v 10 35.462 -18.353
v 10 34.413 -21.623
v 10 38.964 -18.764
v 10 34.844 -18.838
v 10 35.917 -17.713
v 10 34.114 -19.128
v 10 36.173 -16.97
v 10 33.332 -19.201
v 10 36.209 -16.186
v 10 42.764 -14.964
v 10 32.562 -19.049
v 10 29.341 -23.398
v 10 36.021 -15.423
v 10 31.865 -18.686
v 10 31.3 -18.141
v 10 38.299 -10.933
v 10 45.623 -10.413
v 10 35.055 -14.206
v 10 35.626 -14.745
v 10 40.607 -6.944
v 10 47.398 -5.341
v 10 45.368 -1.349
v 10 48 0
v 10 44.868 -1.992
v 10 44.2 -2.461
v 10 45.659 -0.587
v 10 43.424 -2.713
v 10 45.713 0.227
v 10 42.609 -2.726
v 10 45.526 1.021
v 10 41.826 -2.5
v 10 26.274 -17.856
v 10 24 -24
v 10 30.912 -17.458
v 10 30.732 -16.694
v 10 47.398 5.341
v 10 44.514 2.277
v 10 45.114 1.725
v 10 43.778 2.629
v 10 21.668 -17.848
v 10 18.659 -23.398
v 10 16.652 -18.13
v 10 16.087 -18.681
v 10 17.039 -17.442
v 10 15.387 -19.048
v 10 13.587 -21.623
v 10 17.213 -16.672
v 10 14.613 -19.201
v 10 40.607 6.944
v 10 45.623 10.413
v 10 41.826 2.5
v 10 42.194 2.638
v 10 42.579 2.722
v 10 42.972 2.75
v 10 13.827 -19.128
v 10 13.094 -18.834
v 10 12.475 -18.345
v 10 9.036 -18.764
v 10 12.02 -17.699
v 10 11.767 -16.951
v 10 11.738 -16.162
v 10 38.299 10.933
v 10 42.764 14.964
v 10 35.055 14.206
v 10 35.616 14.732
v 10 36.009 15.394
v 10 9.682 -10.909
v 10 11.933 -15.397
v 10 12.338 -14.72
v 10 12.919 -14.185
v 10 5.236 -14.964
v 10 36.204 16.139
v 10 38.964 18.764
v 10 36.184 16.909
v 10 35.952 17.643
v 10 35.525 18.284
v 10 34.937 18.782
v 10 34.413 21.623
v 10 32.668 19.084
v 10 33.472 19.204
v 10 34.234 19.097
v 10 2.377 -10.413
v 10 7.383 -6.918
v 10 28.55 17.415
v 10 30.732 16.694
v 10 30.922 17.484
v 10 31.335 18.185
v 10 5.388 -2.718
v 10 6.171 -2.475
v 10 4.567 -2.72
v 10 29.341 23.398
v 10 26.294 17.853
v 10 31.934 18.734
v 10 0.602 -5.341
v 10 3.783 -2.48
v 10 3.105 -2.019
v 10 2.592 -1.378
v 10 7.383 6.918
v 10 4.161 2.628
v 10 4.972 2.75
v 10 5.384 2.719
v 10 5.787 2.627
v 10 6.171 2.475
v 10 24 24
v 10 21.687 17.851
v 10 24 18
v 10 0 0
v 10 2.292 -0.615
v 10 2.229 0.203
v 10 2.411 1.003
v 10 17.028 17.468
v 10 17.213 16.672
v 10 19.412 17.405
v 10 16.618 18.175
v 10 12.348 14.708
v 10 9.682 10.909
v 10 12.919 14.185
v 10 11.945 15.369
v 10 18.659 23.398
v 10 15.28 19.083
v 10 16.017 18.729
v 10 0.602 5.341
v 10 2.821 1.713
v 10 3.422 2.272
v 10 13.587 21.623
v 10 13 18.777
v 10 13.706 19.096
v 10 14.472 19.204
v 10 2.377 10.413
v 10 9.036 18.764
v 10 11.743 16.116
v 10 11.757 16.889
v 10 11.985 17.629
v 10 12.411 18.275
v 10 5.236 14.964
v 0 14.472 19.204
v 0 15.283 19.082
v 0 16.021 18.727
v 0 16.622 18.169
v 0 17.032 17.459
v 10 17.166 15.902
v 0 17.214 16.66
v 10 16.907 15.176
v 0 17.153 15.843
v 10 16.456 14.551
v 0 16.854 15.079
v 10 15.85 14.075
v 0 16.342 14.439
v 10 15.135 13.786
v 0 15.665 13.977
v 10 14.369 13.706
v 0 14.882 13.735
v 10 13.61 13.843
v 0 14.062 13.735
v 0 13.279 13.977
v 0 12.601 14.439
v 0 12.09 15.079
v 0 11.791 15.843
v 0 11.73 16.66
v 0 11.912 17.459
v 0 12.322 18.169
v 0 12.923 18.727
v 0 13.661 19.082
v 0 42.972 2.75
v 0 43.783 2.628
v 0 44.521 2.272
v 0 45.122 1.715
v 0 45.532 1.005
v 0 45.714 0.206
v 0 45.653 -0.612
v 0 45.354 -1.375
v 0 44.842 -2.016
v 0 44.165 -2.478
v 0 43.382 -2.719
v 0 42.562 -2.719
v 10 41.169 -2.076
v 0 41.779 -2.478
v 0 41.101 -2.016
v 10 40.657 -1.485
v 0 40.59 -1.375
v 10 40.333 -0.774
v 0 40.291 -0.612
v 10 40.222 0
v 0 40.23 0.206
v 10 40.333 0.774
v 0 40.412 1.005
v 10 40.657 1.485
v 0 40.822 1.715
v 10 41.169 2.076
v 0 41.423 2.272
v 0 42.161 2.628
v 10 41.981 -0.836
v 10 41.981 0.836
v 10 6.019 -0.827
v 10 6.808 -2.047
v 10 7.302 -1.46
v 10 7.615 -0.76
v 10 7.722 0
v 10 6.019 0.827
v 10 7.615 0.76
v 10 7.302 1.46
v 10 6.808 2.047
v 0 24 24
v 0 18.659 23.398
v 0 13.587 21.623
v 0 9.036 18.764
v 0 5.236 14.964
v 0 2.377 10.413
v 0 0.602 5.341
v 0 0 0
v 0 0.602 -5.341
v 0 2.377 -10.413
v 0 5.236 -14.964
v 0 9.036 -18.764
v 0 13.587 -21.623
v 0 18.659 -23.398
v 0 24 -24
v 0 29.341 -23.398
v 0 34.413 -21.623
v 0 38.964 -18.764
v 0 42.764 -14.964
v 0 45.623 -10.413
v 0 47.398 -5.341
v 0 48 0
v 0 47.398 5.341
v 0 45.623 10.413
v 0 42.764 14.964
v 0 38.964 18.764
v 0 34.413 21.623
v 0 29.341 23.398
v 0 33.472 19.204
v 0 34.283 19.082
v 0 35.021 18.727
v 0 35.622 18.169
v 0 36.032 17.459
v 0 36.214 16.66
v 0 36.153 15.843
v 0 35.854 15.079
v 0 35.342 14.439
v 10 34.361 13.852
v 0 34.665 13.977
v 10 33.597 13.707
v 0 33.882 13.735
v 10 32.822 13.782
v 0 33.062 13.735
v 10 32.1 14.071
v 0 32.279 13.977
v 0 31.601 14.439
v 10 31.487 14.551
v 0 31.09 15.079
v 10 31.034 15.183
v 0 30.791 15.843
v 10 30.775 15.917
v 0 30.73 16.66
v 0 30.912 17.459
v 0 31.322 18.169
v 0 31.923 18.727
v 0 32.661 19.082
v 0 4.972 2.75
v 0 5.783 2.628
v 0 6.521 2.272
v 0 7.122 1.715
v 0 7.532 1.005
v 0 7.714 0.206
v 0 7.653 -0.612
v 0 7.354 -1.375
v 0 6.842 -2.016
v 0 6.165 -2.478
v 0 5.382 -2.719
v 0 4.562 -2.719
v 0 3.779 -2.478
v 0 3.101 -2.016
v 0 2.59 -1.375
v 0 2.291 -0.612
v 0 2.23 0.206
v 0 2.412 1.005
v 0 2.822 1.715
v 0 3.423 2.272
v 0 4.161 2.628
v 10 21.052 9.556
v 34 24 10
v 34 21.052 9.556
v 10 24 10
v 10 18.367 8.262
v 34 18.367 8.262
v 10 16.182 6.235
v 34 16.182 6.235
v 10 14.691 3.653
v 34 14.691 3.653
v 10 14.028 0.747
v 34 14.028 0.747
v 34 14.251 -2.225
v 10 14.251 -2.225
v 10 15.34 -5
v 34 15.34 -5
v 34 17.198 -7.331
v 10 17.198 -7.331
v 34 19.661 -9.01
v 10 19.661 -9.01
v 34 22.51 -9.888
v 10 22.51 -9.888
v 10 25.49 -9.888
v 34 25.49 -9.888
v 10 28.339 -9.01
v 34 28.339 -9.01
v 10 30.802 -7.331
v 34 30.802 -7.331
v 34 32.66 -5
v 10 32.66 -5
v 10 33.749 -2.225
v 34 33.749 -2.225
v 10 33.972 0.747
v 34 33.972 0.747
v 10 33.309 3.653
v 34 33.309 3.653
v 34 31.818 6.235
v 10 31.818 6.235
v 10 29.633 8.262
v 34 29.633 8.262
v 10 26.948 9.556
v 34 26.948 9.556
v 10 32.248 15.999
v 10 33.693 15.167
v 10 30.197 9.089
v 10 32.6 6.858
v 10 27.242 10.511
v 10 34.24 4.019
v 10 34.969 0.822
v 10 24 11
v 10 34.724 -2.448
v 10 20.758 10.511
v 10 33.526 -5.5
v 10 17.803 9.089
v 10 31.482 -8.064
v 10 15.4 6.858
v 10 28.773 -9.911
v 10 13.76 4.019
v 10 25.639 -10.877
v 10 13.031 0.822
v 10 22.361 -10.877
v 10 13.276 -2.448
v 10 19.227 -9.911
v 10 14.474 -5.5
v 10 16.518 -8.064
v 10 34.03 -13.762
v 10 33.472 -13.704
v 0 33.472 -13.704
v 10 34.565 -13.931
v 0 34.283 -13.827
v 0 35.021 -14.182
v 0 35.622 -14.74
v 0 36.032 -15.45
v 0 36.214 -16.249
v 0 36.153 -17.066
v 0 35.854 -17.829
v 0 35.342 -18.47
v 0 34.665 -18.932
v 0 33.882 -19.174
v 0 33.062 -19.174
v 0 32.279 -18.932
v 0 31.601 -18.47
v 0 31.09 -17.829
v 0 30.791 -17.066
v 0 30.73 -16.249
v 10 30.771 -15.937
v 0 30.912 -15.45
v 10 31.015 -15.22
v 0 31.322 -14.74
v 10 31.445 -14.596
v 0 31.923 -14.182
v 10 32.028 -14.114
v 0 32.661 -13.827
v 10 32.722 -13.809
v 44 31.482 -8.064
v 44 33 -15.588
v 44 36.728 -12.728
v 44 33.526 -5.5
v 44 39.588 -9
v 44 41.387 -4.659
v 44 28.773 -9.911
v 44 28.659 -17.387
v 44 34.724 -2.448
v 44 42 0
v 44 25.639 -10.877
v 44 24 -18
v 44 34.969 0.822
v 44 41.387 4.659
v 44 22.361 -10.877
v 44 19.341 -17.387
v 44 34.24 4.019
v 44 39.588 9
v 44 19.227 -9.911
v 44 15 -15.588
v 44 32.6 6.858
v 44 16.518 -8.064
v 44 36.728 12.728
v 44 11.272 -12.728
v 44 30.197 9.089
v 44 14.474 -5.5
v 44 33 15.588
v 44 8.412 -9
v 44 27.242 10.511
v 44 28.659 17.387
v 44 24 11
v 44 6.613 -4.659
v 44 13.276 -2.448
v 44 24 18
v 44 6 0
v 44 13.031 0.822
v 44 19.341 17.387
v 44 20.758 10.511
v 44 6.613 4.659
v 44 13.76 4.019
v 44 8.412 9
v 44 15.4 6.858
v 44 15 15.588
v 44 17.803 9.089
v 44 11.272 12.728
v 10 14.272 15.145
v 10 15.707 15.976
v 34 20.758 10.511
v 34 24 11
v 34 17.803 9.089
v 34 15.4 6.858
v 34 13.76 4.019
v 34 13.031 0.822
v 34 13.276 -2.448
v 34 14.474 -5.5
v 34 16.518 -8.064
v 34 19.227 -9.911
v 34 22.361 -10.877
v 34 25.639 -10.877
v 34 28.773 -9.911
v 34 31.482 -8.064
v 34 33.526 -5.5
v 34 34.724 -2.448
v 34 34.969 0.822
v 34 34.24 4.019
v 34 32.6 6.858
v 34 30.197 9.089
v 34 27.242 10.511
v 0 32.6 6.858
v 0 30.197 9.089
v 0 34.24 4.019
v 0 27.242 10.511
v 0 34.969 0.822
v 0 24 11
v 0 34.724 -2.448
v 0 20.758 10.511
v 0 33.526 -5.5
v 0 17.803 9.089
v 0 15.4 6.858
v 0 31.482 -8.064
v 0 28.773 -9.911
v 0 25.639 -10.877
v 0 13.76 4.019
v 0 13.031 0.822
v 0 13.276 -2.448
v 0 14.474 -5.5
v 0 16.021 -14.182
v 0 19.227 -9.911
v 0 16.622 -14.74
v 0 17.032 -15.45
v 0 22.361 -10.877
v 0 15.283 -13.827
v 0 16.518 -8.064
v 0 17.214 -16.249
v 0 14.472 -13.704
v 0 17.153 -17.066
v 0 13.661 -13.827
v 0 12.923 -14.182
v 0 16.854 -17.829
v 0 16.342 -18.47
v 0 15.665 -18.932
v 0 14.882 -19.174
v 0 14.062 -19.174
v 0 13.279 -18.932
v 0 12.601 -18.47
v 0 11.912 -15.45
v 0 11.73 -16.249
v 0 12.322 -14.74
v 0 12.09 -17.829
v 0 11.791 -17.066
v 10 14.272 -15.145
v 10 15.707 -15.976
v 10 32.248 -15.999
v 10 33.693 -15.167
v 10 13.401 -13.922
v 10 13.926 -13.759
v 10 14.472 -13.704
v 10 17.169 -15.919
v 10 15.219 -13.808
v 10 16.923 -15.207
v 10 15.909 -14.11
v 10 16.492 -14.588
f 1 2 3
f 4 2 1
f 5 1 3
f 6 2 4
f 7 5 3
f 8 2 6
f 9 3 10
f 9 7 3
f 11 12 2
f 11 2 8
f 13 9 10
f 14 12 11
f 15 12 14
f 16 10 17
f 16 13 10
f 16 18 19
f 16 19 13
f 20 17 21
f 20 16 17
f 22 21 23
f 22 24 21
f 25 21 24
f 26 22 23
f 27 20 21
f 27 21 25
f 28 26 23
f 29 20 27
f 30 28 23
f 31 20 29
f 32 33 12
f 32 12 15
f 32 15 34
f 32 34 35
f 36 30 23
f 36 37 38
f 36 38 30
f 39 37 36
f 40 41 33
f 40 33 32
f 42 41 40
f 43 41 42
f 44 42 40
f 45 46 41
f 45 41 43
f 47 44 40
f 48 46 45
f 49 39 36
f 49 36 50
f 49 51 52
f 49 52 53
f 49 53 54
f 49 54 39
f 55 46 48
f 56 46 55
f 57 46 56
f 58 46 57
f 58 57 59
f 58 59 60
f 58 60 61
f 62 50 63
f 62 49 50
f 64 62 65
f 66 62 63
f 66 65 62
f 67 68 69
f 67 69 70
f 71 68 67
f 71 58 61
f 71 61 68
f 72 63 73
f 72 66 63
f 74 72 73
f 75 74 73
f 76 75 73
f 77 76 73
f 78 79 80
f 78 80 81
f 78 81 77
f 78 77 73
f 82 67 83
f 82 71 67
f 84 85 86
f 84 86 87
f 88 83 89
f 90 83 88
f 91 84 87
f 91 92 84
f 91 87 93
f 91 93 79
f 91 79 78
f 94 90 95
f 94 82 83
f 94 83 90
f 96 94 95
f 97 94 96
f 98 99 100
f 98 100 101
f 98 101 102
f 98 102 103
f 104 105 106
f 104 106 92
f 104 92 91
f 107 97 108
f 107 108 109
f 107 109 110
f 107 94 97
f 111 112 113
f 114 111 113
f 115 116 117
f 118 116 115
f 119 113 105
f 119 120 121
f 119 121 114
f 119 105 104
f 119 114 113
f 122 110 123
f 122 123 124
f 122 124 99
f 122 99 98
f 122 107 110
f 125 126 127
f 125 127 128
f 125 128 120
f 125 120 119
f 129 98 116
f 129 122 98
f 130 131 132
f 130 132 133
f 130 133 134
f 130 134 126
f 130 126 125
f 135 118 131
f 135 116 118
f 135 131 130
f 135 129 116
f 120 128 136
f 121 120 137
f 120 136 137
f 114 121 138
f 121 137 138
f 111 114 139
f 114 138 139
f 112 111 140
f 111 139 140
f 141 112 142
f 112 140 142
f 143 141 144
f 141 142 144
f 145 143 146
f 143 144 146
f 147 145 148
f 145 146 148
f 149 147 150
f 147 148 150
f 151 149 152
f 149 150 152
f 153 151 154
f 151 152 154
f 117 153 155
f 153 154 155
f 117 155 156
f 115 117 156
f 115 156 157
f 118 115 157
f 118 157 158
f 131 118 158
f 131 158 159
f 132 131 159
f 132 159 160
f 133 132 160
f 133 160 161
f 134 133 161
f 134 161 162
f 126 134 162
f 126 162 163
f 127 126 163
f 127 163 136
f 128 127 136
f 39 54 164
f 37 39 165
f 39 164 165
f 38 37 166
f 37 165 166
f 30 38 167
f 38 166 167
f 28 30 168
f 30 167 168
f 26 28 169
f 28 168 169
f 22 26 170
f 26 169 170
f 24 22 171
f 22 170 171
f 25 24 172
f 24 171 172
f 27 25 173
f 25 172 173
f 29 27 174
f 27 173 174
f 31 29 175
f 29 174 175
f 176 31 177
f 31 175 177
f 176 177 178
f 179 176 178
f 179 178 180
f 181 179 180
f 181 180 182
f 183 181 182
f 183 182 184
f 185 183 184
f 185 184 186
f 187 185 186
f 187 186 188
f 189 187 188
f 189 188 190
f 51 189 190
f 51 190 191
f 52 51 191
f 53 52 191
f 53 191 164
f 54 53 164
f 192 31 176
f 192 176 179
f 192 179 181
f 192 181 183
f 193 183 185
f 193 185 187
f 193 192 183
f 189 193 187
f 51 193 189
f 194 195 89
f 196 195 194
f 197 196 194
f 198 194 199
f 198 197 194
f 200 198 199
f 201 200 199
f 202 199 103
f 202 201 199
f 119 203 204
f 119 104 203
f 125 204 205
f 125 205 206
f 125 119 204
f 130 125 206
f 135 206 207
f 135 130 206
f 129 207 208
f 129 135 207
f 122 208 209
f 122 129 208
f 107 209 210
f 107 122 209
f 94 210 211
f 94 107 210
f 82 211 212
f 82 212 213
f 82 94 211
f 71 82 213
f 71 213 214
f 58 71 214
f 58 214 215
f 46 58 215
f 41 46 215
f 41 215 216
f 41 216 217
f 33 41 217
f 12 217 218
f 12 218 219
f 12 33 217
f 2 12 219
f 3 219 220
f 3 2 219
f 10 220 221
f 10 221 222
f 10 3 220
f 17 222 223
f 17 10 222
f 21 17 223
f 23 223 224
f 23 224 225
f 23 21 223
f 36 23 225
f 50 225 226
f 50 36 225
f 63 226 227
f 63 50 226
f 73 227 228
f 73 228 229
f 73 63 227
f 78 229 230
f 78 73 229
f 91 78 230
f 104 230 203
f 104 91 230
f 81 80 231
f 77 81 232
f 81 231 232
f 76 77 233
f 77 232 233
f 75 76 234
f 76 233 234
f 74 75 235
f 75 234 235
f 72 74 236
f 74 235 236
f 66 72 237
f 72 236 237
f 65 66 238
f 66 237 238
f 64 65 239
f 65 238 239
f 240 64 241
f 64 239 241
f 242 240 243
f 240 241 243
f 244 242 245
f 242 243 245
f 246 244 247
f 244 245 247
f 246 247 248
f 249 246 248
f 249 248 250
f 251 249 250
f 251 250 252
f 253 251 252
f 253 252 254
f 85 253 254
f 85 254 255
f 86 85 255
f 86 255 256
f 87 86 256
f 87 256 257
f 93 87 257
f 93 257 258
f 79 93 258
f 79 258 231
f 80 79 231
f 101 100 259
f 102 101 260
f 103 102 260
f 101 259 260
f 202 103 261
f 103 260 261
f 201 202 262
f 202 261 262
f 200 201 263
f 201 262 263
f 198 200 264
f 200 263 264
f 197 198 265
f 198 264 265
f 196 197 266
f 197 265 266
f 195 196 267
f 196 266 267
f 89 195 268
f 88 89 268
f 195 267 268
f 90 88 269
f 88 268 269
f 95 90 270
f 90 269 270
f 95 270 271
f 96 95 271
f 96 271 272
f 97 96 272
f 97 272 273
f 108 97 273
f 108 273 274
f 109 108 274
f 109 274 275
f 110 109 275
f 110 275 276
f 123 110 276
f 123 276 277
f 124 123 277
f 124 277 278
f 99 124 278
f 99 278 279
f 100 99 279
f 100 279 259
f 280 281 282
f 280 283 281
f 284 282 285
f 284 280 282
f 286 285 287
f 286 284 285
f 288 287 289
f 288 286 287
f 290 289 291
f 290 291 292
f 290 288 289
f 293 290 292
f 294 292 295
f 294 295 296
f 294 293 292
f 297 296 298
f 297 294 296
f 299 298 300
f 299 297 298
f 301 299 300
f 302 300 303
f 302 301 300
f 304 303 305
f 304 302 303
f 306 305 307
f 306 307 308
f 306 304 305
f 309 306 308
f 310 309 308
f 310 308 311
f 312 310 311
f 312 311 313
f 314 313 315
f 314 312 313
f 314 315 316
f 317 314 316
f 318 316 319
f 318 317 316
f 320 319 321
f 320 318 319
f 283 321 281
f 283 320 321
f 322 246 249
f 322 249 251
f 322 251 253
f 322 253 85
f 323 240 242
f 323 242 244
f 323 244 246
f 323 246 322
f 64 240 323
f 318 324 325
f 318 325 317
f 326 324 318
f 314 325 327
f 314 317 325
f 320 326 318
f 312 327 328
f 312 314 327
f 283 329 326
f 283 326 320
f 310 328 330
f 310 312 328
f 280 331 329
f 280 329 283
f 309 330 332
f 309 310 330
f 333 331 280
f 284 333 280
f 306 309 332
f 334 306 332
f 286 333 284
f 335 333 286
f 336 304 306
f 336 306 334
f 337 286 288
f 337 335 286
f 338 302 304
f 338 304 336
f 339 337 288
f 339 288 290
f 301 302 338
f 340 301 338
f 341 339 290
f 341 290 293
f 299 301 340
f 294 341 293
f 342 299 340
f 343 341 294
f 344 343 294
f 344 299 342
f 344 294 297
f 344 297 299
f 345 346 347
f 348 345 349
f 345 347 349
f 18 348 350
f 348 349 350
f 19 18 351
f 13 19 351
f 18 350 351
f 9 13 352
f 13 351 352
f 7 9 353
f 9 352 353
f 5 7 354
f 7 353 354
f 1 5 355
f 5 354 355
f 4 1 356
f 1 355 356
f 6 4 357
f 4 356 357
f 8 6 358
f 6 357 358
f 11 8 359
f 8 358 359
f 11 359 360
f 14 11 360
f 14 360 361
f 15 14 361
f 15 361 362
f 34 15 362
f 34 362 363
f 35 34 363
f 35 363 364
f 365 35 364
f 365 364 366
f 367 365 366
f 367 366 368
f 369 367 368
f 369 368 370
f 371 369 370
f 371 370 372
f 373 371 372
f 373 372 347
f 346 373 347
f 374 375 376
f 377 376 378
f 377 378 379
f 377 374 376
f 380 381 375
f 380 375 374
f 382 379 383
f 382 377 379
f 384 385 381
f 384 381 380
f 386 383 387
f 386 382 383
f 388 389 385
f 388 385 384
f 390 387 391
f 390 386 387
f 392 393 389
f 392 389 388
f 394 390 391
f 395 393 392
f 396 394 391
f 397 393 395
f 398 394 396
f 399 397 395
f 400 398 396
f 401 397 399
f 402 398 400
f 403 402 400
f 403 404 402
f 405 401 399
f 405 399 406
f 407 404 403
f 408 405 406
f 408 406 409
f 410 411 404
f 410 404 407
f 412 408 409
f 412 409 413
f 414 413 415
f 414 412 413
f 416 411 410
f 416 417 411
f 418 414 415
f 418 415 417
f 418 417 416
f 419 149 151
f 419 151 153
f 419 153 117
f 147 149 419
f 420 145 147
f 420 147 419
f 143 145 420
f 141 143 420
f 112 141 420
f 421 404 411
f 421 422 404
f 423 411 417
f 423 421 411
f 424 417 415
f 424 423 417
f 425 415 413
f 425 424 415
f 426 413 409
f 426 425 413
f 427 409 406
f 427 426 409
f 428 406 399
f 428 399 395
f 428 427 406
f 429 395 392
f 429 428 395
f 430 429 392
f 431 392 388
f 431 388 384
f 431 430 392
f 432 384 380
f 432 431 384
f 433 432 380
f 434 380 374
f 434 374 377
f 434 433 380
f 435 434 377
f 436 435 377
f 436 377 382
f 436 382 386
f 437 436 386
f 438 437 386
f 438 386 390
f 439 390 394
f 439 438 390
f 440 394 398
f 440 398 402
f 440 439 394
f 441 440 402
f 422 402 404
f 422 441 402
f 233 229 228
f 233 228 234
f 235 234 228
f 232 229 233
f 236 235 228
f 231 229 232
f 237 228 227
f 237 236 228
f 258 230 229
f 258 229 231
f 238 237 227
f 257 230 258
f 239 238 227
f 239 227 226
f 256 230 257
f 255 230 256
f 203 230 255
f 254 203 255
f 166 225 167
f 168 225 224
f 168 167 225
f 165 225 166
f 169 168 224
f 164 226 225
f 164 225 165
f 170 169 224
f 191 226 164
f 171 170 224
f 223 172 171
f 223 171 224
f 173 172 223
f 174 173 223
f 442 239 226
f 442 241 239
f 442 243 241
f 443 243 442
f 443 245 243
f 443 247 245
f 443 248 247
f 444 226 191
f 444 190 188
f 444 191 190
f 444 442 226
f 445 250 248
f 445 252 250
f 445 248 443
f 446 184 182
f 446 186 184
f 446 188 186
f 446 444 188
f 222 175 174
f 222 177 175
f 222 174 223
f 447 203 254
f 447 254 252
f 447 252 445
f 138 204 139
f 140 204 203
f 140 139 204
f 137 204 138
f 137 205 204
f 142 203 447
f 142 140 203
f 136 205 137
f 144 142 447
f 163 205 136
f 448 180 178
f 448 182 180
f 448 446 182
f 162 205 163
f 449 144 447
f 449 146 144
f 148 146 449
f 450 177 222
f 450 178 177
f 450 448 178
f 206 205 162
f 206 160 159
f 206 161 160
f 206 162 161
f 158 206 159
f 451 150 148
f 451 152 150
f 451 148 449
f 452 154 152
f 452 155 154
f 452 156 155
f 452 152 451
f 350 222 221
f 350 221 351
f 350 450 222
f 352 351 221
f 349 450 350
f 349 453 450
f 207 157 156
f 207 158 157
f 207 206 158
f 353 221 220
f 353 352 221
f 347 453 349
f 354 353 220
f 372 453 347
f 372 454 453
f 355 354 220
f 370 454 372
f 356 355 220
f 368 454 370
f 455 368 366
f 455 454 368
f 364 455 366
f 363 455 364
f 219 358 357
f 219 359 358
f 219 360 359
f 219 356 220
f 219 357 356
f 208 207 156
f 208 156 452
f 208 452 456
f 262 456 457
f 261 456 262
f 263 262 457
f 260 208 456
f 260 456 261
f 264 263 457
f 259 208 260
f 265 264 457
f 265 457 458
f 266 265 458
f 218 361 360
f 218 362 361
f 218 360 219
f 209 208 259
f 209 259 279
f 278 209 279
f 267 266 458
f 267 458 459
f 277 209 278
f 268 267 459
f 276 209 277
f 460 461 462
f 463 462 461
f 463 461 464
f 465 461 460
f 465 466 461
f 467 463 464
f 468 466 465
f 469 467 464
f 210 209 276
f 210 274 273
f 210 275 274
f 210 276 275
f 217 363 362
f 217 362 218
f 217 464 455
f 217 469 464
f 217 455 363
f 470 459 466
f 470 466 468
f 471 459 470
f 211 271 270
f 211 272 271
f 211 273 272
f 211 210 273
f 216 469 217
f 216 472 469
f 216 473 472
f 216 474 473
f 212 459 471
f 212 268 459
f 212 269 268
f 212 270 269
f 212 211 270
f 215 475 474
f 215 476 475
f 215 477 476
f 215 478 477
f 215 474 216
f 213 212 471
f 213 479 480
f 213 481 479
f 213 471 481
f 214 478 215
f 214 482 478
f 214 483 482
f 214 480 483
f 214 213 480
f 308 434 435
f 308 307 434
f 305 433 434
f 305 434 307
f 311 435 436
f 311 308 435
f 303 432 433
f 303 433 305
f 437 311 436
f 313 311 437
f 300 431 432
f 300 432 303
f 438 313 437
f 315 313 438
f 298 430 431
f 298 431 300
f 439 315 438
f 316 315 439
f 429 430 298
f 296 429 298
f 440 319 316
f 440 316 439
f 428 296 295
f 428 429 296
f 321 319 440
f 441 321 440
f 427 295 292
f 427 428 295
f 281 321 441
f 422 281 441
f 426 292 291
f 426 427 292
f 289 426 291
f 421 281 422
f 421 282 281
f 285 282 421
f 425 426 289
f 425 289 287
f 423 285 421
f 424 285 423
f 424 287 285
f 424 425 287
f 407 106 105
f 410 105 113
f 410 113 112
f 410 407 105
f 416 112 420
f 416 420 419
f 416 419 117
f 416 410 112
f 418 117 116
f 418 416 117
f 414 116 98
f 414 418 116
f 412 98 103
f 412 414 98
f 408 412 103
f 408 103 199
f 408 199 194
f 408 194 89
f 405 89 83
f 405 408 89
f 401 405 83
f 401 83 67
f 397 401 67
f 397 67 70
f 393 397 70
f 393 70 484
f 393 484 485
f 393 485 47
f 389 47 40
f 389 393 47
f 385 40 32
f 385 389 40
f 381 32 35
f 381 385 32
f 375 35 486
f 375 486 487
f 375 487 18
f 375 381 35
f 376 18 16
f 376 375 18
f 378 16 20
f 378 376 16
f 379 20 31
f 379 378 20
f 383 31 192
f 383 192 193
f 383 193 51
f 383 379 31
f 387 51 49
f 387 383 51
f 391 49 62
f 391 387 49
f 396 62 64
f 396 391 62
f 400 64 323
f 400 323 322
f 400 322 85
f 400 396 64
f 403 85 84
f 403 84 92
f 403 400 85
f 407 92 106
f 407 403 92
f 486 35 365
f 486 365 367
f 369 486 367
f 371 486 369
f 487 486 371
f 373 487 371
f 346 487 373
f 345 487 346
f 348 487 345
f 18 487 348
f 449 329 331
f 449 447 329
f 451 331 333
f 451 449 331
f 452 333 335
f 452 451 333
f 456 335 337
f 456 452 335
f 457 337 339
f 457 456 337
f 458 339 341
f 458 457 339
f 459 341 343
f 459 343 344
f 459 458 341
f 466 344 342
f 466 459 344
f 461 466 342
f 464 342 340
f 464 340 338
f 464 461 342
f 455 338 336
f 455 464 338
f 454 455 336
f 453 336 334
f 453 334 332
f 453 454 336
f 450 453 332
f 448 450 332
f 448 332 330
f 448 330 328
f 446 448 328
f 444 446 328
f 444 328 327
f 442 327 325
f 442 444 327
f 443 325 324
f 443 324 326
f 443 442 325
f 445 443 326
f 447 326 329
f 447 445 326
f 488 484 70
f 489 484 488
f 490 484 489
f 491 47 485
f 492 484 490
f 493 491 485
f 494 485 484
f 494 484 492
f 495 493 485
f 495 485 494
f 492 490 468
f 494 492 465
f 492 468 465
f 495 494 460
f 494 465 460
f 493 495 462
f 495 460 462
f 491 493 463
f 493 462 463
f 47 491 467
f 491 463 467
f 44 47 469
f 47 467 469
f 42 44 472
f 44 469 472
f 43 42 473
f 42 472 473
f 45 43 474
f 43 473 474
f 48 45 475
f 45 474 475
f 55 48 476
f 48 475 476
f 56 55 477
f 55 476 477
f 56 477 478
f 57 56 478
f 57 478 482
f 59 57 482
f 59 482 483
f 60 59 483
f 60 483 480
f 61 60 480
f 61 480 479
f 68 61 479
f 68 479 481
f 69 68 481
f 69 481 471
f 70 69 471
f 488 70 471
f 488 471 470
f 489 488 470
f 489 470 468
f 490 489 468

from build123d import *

# Parameters (mm, degrees)
SKETCH2_R          = 2.75
CUT_EXTRUDE1_DEPTH = 10


with BuildPart() as part:
    # Sketch1 → Revolve1 (revolve)
    with BuildSketch(Plane.XY, mode=Mode.PRIVATE) as revolve1_sk:
        Polygon((10, 0), (10, 6), (44, 6), (44, 13), (34, 13), (34, 14), (10, 14), (10, 13), (0, 13), (0, 0), align=None)
    revolve(revolve1_sk.sketch.rotate(Axis((0, 24, 0), (1, 0, 0)), 270), axis=Axis((0, 24, 0), (1, 0, 0)))

    # Sketch2 → Cut-Extrude1 (cut)
    with BuildSketch(Plane.ZY):
        with Locations((0, 42.971966769)):
            Circle(SKETCH2_R)
        with Locations((16.454482672, 33.471966769)):
            Circle(SKETCH2_R)
        with Locations((16.454482672, 14.471966769)):
            Circle(SKETCH2_R)
        with Locations((0, 4.971966769)):
            Circle(SKETCH2_R)
        with Locations((-16.454482672, 14.471966769)):
            Circle(SKETCH2_R)
        with Locations((-16.454482672, 33.471966769)):
            Circle(SKETCH2_R)
    extrude(amount=-CUT_EXTRUDE1_DEPTH, mode=Mode.SUBTRACT)


solid = part.part
